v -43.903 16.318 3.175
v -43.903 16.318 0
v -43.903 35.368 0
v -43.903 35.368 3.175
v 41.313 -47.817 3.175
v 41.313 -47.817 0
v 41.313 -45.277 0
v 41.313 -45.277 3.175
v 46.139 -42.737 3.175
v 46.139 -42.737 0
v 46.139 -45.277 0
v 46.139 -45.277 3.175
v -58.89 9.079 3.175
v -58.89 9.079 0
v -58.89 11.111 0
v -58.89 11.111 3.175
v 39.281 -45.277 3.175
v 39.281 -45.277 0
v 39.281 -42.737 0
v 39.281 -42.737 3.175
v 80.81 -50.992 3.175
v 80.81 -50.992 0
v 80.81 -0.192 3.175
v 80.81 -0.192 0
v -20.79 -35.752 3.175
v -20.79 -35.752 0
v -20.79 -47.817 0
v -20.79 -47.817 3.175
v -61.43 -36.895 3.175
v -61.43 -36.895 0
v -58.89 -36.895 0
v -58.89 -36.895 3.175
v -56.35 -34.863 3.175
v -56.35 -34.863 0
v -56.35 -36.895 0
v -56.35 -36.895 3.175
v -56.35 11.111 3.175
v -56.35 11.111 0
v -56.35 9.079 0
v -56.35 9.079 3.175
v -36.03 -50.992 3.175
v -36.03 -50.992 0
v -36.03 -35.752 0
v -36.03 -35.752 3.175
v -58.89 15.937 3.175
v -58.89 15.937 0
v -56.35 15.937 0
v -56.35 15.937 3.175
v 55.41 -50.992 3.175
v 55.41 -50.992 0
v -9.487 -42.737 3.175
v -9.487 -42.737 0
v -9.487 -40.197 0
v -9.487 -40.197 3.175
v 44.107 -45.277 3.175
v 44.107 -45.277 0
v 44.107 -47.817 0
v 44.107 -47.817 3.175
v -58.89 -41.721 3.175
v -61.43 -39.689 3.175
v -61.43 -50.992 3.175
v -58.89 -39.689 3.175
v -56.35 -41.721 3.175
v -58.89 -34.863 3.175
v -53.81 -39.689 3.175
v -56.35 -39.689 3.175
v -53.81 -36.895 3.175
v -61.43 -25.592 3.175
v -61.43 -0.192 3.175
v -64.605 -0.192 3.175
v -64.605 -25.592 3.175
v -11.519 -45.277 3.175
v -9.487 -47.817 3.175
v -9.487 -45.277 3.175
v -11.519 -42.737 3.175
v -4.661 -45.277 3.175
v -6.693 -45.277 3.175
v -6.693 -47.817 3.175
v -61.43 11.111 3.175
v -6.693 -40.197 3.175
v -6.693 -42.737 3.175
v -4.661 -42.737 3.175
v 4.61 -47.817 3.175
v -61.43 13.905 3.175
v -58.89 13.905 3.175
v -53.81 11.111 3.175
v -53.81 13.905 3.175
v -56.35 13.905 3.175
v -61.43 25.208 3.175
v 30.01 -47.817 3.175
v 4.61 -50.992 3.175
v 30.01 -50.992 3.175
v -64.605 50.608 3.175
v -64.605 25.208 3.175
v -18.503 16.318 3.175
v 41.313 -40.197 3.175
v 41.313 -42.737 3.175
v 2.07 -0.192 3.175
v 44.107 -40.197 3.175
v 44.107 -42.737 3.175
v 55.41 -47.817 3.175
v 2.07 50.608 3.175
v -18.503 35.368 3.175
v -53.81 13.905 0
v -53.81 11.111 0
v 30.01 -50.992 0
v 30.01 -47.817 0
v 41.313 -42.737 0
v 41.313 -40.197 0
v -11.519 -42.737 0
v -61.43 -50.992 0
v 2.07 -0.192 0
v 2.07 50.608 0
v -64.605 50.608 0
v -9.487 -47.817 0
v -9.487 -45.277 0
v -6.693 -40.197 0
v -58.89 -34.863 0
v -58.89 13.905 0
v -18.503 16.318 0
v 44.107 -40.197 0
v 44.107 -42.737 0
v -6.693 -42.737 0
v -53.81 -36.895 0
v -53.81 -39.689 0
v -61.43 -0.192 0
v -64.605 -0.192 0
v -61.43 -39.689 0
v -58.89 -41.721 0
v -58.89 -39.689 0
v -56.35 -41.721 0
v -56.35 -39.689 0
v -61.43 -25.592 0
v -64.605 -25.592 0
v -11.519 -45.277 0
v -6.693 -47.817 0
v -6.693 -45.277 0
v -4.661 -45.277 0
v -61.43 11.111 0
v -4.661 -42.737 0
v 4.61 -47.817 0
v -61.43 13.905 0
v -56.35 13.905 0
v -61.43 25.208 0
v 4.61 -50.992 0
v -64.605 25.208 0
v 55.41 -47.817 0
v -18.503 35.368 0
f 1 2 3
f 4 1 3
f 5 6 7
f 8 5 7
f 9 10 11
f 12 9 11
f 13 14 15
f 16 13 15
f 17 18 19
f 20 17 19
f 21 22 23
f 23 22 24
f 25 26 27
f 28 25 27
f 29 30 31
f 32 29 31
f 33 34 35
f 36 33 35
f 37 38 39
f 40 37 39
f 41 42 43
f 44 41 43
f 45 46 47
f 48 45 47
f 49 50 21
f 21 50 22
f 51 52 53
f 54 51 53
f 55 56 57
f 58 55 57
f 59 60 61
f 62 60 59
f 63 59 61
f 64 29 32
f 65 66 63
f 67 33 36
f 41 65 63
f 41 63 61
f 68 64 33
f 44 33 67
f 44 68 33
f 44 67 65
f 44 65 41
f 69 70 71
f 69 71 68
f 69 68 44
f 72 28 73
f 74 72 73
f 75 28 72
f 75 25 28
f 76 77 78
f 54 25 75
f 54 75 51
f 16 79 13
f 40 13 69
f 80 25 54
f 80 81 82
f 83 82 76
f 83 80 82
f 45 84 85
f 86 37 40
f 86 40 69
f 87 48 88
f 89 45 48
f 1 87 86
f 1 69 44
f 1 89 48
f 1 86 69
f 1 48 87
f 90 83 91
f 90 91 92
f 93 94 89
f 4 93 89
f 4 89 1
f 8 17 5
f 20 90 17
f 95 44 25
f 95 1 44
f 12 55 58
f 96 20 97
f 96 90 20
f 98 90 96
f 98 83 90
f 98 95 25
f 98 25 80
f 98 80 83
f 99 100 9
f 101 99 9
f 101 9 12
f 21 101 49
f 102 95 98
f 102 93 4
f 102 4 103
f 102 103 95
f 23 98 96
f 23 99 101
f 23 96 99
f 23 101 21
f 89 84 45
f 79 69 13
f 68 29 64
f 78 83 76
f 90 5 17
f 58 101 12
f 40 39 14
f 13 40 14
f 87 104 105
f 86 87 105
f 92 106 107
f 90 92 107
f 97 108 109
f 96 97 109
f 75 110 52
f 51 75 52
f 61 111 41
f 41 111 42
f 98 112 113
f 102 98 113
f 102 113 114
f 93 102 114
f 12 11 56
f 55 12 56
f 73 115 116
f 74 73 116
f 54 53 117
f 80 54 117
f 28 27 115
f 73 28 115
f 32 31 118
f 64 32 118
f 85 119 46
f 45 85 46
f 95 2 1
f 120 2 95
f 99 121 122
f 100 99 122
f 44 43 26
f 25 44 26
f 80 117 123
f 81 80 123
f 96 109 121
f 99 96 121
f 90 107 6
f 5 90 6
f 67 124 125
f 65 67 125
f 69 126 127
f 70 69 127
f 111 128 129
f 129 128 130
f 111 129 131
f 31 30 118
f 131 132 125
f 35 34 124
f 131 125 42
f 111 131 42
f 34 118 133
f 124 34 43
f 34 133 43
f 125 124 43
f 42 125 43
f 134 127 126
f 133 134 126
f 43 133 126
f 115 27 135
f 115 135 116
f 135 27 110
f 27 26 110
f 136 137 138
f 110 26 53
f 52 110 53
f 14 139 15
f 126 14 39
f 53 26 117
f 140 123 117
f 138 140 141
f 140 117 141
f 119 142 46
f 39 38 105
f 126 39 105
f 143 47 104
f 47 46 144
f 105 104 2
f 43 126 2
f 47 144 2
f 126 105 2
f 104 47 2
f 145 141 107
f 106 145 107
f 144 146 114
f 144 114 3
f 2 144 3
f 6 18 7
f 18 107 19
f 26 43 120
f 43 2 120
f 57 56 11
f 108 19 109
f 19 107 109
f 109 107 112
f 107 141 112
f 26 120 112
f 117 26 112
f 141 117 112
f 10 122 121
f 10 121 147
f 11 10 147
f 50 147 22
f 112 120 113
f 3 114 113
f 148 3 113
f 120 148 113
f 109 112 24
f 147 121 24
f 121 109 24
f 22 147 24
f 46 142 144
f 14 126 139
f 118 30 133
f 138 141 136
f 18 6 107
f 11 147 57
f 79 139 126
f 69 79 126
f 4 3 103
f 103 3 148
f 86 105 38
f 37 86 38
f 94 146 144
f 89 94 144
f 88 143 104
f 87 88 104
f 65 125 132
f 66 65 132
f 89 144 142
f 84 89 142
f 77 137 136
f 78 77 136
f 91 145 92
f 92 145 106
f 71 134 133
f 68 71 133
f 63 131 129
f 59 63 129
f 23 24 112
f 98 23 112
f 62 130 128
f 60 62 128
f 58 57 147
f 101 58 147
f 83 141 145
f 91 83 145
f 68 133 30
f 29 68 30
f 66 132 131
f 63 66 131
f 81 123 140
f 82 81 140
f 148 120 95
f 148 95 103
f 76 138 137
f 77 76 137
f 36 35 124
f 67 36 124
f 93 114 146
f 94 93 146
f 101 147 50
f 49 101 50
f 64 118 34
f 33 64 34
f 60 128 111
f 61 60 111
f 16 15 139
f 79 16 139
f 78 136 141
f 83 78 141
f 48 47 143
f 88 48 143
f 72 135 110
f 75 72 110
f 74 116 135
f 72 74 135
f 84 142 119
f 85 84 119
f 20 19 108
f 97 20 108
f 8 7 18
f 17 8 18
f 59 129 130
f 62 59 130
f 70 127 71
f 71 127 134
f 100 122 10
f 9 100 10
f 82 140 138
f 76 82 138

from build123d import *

# Parameters (mm, degrees)
F0_W     = 25.4
F0_H     = 19.05
F1_DEPTH = 3.175


# Not quite as in the source:
# - a feature names something its author has since deleted; it is built from what else it names


with BuildPart() as f1:
    # F0 (on Top) → F1 (new body)
    with BuildSketch(Plane.XY):
        Polygon((2.0699514867, -0.1923768919), (2.0699514867, 50.6076231081), (-61.4300485133, 50.6076231081), (-64.6050485133, 50.6076231081), (-64.6050485133, 25.2076231081), (-61.4300485133, 25.2076231081), (-61.4300485133, 13.9046231081), (-58.8900485133, 13.9046231081), (-58.8900485133, 15.9366231081), (-56.3500485133, 15.9366231081), (-56.3500485133, 13.9046231081), (-53.8100485133, 13.9046231081), (-53.8100485133, 11.1106231081), (-56.3500485133, 11.1106231081), (-56.3500485133, 9.0786231081), (-58.8900485133, 9.0786231081), (-58.8900485133, 11.1106231081), (-61.4300485133, 11.1106231081), (-61.4300485133, -0.1923768919), (-64.6050485133, -0.1923768919), (-64.6050485133, -25.5923768919), (-61.4300485133, -25.5923768919), (-61.4300485133, -36.8953768919), (-58.8900485133, -36.8953768919), (-58.8900485133, -34.8633768919), (-56.3500485133, -34.8633768919), (-56.3500485133, -36.8953768919), (-53.8100485133, -36.8953768919), (-53.8100485133, -39.6893768919), (-56.3500485133, -39.6893768919), (-56.3500485133, -41.7213768919), (-58.8900485133, -41.7213768919), (-58.8900485133, -39.6893768919), (-61.4300485133, -39.6893768919), (-61.4300485133, -50.9923768919), (-36.0300485133, -50.9923768919), (-36.0300485133, -35.7523768919), (-20.7900485133, -35.7523768919), (-20.7900485133, -47.8173768919), (-9.4870485133, -47.8173768919), (-9.4870485133, -45.2773768919), (-11.5190485133, -45.2773768919), (-11.5190485133, -42.7373768919), (-9.4870485133, -42.7373768919), (-9.4870485133, -40.1973768919), (-6.6930485133, -40.1973768919), (-6.6930485133, -42.7373768919), (-4.6610485133, -42.7373768919), (-4.6610485133, -45.2773768919), (-6.6930485133, -45.2773768919), (-6.6930485133, -47.8173768919), (4.6099514867, -47.8173768919), (4.6099514867, -50.9923768919), (30.0099514867, -50.9923768919), (30.0099514867, -47.8173768919), (41.3129514867, -47.8173768919), (41.3129514867, -45.2773768919), (39.2809514867, -45.2773768919), (39.2809514867, -42.7373768919), (41.3129514867, -42.7373768919), (41.3129514867, -40.1973768919), (44.1069514867, -40.1973768919), (44.1069514867, -42.7373768919), (46.1389514867, -42.7373768919), (46.1389514867, -45.2773768919), (44.1069514867, -45.2773768919), (44.1069514867, -47.8173768919), (55.4099514867, -47.8173768919), (55.4099514867, -50.9923768919), (80.8099514867, -50.9923768919), (80.8099514867, -0.1923768919), align=None)
        with Locations((-31.2025573432, 25.8426231081)):
            Rectangle(F0_W, F0_H, mode=Mode.SUBTRACT)
    extrude(amount=F1_DEPTH)


solid = f1.part
